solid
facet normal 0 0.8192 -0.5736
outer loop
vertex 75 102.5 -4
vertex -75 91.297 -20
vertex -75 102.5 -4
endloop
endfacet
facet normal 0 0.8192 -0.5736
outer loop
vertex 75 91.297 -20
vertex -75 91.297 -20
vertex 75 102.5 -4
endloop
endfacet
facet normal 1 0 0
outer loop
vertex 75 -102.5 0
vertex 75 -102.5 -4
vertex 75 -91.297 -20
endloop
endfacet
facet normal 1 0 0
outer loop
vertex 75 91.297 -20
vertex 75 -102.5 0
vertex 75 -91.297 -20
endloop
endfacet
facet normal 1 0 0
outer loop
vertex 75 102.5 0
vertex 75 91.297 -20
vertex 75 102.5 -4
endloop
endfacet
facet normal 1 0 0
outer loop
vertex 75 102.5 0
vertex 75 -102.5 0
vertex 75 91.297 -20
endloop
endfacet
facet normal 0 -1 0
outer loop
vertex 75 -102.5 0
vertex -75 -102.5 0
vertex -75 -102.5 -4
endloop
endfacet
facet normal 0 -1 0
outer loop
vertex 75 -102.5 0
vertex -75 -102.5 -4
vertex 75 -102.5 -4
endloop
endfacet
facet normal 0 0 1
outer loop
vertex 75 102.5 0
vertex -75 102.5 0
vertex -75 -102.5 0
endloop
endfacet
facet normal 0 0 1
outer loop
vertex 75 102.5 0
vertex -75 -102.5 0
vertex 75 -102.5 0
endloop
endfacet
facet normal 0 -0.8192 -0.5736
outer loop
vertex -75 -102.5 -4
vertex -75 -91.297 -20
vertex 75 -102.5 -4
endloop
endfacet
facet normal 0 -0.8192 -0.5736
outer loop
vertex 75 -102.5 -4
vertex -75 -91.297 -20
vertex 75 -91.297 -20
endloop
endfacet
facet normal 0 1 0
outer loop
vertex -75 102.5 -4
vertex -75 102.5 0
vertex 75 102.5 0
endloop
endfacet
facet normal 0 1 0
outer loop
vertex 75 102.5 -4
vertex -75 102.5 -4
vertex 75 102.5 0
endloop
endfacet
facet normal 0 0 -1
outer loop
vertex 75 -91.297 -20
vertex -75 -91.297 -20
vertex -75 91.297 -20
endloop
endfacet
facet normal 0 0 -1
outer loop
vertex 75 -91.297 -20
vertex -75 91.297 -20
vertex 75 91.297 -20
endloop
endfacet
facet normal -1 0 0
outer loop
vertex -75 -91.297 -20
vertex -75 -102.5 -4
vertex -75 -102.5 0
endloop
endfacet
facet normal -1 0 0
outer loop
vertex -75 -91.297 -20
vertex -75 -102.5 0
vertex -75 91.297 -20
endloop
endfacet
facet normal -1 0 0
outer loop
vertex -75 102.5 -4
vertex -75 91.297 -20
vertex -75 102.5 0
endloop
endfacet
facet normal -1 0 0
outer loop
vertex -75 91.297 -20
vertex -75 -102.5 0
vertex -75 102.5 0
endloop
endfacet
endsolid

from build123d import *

# Parameters (mm, degrees)
SKETCH_1_W             = 150
SKETCH_1_H             = 205
SM_BASE_FLANGE_1_DEPTH = 20
CHAMFER_1_SIZE         = 16
CHAMFER_1_SIZE2        = 11.203320611
CHAMFER_2_SIZE         = 16
CHAMFER_2_SIZE2        = 11.203320611


# Sheet-metal steps are written as plain solids
with BuildPart() as part:
    # Sketch 1 → 基体-法兰1 (new body)
    with BuildSketch(Plane.XY):
        Rectangle(SKETCH_1_W, SKETCH_1_H)
    extrude(amount=-SM_BASE_FLANGE_1_DEPTH)

    # 倒角1
    chamfer_1_edges = [part.edges().sort_by_distance(p)[0] for p in [
        (0, 102.5, -20),
    ]]
    chamfer_1_side = [part.faces().sort_by_distance(p)[0] for p in [
        (0, 102.5, -10),
    ]]
    chamfer(chamfer_1_edges, length=CHAMFER_1_SIZE, length2=CHAMFER_1_SIZE2, reference=chamfer_1_side[0])

    # 倒角2
    chamfer_2_edges = [part.edges().sort_by_distance(p)[0] for p in [
        (0, -102.5, -20),
    ]]
    chamfer_2_side = [part.faces().sort_by_distance(p)[0] for p in [
        (0, -102.5, -10),
    ]]
    chamfer(chamfer_2_edges, length=CHAMFER_2_SIZE, length2=CHAMFER_2_SIZE2, reference=chamfer_2_side[0])


solid = part.part
